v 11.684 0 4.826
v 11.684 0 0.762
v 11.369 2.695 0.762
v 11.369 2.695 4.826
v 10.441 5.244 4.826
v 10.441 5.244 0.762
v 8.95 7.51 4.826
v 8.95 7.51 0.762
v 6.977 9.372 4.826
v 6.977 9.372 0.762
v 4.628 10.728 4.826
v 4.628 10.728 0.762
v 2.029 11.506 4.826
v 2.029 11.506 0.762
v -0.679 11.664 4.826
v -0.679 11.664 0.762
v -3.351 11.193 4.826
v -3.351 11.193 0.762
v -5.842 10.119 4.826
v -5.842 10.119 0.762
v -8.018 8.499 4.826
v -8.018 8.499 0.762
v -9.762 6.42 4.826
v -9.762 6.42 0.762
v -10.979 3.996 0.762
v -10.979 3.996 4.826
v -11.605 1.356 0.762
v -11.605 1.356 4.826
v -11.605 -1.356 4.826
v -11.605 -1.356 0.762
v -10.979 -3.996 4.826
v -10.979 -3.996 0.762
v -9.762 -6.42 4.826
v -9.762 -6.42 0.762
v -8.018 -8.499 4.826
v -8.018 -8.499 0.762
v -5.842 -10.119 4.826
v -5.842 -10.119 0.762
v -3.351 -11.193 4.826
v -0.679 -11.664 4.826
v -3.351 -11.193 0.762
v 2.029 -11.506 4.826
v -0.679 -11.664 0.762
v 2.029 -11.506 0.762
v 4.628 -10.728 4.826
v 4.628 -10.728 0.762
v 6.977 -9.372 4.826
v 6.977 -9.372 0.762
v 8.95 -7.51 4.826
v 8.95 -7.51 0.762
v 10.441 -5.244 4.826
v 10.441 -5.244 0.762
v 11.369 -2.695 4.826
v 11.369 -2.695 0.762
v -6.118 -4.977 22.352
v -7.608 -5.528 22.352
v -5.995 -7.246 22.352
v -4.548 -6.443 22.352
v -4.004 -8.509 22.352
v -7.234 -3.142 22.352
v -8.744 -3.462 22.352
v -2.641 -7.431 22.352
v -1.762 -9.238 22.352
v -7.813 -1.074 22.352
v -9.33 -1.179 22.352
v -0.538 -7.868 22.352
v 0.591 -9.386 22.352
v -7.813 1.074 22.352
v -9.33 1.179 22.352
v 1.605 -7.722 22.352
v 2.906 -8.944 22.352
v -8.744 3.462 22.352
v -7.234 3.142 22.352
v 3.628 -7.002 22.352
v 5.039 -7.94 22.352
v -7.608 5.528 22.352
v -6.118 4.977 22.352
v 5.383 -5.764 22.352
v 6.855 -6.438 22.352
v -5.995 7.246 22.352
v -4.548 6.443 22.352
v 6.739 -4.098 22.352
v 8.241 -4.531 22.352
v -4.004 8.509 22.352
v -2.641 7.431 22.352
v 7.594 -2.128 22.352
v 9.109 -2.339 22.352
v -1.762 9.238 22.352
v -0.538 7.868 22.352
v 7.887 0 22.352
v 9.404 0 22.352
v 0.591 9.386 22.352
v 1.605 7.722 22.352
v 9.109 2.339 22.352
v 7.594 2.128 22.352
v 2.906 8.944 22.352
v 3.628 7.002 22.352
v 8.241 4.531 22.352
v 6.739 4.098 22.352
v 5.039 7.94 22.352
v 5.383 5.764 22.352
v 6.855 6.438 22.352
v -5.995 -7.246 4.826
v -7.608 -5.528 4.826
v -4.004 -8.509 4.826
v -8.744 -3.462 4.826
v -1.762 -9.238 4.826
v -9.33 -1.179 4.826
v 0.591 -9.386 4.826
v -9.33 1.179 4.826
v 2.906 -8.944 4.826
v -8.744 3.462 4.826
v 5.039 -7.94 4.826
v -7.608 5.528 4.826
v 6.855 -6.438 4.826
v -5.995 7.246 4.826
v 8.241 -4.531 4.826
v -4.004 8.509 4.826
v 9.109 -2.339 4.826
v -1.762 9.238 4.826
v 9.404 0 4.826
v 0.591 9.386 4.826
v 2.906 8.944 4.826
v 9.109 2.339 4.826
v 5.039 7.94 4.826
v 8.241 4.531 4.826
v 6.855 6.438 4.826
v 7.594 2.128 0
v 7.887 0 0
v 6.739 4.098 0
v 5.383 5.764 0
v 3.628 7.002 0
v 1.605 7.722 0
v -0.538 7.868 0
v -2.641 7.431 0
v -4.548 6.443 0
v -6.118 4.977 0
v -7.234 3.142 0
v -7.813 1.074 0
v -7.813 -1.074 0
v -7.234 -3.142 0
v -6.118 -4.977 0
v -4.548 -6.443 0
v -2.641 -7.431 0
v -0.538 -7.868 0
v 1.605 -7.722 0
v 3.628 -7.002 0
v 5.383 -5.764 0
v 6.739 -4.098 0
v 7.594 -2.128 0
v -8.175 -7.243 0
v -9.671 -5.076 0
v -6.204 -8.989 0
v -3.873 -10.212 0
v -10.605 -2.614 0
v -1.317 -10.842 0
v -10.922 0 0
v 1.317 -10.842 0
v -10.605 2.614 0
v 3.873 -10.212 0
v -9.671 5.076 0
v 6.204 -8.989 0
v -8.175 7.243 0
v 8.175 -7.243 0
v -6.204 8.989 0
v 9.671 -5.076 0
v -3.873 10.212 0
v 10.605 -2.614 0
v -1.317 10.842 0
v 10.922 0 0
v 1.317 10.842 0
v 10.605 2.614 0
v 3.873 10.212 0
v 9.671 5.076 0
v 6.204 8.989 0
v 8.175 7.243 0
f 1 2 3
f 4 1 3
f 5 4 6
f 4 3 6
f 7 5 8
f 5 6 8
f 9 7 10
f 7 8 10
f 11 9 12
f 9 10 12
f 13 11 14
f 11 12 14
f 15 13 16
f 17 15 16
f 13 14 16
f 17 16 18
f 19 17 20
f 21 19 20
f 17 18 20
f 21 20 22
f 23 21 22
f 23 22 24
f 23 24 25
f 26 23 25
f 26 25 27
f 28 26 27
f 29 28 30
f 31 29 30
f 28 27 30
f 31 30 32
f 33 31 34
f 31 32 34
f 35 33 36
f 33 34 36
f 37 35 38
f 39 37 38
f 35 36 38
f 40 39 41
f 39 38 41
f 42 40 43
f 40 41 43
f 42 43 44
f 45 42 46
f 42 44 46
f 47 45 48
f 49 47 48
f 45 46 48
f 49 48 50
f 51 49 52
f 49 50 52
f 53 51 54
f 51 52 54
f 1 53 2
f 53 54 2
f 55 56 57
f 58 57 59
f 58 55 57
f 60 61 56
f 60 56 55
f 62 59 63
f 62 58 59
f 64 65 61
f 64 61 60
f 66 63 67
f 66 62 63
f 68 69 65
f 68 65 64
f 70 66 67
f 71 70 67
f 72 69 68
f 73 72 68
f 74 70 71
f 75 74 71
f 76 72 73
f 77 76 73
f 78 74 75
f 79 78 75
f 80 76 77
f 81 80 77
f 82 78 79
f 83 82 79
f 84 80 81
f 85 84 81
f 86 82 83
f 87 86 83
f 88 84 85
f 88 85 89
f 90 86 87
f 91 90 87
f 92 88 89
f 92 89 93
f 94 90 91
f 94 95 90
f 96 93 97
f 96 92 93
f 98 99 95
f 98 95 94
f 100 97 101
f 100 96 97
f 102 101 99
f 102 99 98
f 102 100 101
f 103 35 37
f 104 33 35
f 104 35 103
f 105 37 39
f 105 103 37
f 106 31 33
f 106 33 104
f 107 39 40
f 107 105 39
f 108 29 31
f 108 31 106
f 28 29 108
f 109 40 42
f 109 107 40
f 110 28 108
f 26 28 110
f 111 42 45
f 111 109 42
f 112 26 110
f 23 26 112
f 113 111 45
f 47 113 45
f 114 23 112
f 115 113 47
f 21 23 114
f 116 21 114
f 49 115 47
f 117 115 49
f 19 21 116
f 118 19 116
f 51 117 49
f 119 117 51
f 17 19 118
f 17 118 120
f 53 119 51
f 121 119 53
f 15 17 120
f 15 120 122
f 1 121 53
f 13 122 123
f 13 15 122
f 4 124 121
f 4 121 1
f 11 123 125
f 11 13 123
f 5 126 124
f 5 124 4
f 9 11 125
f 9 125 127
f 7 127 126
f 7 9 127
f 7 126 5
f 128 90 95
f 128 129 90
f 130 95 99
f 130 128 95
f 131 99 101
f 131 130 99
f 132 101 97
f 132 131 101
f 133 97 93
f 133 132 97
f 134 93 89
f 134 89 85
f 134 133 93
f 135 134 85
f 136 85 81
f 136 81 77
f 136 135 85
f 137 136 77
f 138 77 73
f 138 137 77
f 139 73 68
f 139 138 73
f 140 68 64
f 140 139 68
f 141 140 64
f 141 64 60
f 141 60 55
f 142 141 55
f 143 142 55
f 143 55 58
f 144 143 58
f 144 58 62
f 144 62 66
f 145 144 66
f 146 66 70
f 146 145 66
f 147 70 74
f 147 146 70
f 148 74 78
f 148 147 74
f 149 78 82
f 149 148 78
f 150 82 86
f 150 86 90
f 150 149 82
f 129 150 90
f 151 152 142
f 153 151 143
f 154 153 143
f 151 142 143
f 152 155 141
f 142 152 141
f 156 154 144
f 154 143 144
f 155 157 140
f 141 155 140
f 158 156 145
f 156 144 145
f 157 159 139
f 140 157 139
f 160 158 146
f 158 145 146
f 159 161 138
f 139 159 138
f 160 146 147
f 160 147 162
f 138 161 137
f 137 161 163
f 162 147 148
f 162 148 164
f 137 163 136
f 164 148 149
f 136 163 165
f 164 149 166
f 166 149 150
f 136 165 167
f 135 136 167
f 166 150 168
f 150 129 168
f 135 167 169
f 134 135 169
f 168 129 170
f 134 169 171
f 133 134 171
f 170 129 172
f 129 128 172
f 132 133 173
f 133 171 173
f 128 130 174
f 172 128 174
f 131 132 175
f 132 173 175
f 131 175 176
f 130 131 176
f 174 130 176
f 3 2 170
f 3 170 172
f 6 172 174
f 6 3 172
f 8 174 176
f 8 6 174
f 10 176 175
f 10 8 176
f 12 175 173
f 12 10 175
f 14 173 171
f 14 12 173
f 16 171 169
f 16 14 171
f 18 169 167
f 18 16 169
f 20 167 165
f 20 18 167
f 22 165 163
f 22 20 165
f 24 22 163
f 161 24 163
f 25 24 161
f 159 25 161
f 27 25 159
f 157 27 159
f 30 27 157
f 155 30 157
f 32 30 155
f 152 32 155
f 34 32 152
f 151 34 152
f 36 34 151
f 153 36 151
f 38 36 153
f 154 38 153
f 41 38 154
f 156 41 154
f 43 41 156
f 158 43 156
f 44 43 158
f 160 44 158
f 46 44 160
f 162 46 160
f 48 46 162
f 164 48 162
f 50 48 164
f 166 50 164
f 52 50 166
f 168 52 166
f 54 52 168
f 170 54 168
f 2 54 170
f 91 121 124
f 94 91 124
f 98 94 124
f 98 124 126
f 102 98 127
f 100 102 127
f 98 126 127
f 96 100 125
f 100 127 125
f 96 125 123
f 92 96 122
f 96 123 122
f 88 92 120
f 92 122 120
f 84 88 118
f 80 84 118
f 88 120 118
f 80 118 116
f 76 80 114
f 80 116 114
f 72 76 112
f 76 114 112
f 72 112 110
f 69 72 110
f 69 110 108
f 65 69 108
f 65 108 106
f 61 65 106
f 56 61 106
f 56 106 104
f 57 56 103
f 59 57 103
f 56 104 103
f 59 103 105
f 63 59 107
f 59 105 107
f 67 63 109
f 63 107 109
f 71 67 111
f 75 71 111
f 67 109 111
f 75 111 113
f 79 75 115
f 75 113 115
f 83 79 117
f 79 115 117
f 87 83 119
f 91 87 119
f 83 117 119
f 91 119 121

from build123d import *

# Parameters (mm, degrees)
F0_R     = 11.684
F0_R_2   = 7.8867
F1_DEPTH = 4.826
F2_R     = 9.40435
F2_R_2   = 7.8867
F3_DEPTH = 17.526
F4_SIZE2 = 0.762
F4_SIZE  = 0.762


with BuildPart() as f1:
    # F0 (on Top) → F1 (new body)
    with BuildSketch(Plane.XY):
        Circle(F0_R)
        Circle(F0_R_2, mode=Mode.SUBTRACT)
    extrude(amount=F1_DEPTH)

    # F2 (on face) → F3 (join)
    with BuildSketch(Plane.XY.offset(4.826)):
        Circle(F2_R)
        Circle(F2_R_2, mode=Mode.SUBTRACT)
    extrude(amount=F3_DEPTH)

    # F4
    f4_edges = [f1.edges().sort_by_distance(p)[0] for p in [
        (-11.684, 0, 0),
    ]]
    chamfer(f4_edges, length=F4_SIZE, length2=F4_SIZE2)


solid = f1.part
